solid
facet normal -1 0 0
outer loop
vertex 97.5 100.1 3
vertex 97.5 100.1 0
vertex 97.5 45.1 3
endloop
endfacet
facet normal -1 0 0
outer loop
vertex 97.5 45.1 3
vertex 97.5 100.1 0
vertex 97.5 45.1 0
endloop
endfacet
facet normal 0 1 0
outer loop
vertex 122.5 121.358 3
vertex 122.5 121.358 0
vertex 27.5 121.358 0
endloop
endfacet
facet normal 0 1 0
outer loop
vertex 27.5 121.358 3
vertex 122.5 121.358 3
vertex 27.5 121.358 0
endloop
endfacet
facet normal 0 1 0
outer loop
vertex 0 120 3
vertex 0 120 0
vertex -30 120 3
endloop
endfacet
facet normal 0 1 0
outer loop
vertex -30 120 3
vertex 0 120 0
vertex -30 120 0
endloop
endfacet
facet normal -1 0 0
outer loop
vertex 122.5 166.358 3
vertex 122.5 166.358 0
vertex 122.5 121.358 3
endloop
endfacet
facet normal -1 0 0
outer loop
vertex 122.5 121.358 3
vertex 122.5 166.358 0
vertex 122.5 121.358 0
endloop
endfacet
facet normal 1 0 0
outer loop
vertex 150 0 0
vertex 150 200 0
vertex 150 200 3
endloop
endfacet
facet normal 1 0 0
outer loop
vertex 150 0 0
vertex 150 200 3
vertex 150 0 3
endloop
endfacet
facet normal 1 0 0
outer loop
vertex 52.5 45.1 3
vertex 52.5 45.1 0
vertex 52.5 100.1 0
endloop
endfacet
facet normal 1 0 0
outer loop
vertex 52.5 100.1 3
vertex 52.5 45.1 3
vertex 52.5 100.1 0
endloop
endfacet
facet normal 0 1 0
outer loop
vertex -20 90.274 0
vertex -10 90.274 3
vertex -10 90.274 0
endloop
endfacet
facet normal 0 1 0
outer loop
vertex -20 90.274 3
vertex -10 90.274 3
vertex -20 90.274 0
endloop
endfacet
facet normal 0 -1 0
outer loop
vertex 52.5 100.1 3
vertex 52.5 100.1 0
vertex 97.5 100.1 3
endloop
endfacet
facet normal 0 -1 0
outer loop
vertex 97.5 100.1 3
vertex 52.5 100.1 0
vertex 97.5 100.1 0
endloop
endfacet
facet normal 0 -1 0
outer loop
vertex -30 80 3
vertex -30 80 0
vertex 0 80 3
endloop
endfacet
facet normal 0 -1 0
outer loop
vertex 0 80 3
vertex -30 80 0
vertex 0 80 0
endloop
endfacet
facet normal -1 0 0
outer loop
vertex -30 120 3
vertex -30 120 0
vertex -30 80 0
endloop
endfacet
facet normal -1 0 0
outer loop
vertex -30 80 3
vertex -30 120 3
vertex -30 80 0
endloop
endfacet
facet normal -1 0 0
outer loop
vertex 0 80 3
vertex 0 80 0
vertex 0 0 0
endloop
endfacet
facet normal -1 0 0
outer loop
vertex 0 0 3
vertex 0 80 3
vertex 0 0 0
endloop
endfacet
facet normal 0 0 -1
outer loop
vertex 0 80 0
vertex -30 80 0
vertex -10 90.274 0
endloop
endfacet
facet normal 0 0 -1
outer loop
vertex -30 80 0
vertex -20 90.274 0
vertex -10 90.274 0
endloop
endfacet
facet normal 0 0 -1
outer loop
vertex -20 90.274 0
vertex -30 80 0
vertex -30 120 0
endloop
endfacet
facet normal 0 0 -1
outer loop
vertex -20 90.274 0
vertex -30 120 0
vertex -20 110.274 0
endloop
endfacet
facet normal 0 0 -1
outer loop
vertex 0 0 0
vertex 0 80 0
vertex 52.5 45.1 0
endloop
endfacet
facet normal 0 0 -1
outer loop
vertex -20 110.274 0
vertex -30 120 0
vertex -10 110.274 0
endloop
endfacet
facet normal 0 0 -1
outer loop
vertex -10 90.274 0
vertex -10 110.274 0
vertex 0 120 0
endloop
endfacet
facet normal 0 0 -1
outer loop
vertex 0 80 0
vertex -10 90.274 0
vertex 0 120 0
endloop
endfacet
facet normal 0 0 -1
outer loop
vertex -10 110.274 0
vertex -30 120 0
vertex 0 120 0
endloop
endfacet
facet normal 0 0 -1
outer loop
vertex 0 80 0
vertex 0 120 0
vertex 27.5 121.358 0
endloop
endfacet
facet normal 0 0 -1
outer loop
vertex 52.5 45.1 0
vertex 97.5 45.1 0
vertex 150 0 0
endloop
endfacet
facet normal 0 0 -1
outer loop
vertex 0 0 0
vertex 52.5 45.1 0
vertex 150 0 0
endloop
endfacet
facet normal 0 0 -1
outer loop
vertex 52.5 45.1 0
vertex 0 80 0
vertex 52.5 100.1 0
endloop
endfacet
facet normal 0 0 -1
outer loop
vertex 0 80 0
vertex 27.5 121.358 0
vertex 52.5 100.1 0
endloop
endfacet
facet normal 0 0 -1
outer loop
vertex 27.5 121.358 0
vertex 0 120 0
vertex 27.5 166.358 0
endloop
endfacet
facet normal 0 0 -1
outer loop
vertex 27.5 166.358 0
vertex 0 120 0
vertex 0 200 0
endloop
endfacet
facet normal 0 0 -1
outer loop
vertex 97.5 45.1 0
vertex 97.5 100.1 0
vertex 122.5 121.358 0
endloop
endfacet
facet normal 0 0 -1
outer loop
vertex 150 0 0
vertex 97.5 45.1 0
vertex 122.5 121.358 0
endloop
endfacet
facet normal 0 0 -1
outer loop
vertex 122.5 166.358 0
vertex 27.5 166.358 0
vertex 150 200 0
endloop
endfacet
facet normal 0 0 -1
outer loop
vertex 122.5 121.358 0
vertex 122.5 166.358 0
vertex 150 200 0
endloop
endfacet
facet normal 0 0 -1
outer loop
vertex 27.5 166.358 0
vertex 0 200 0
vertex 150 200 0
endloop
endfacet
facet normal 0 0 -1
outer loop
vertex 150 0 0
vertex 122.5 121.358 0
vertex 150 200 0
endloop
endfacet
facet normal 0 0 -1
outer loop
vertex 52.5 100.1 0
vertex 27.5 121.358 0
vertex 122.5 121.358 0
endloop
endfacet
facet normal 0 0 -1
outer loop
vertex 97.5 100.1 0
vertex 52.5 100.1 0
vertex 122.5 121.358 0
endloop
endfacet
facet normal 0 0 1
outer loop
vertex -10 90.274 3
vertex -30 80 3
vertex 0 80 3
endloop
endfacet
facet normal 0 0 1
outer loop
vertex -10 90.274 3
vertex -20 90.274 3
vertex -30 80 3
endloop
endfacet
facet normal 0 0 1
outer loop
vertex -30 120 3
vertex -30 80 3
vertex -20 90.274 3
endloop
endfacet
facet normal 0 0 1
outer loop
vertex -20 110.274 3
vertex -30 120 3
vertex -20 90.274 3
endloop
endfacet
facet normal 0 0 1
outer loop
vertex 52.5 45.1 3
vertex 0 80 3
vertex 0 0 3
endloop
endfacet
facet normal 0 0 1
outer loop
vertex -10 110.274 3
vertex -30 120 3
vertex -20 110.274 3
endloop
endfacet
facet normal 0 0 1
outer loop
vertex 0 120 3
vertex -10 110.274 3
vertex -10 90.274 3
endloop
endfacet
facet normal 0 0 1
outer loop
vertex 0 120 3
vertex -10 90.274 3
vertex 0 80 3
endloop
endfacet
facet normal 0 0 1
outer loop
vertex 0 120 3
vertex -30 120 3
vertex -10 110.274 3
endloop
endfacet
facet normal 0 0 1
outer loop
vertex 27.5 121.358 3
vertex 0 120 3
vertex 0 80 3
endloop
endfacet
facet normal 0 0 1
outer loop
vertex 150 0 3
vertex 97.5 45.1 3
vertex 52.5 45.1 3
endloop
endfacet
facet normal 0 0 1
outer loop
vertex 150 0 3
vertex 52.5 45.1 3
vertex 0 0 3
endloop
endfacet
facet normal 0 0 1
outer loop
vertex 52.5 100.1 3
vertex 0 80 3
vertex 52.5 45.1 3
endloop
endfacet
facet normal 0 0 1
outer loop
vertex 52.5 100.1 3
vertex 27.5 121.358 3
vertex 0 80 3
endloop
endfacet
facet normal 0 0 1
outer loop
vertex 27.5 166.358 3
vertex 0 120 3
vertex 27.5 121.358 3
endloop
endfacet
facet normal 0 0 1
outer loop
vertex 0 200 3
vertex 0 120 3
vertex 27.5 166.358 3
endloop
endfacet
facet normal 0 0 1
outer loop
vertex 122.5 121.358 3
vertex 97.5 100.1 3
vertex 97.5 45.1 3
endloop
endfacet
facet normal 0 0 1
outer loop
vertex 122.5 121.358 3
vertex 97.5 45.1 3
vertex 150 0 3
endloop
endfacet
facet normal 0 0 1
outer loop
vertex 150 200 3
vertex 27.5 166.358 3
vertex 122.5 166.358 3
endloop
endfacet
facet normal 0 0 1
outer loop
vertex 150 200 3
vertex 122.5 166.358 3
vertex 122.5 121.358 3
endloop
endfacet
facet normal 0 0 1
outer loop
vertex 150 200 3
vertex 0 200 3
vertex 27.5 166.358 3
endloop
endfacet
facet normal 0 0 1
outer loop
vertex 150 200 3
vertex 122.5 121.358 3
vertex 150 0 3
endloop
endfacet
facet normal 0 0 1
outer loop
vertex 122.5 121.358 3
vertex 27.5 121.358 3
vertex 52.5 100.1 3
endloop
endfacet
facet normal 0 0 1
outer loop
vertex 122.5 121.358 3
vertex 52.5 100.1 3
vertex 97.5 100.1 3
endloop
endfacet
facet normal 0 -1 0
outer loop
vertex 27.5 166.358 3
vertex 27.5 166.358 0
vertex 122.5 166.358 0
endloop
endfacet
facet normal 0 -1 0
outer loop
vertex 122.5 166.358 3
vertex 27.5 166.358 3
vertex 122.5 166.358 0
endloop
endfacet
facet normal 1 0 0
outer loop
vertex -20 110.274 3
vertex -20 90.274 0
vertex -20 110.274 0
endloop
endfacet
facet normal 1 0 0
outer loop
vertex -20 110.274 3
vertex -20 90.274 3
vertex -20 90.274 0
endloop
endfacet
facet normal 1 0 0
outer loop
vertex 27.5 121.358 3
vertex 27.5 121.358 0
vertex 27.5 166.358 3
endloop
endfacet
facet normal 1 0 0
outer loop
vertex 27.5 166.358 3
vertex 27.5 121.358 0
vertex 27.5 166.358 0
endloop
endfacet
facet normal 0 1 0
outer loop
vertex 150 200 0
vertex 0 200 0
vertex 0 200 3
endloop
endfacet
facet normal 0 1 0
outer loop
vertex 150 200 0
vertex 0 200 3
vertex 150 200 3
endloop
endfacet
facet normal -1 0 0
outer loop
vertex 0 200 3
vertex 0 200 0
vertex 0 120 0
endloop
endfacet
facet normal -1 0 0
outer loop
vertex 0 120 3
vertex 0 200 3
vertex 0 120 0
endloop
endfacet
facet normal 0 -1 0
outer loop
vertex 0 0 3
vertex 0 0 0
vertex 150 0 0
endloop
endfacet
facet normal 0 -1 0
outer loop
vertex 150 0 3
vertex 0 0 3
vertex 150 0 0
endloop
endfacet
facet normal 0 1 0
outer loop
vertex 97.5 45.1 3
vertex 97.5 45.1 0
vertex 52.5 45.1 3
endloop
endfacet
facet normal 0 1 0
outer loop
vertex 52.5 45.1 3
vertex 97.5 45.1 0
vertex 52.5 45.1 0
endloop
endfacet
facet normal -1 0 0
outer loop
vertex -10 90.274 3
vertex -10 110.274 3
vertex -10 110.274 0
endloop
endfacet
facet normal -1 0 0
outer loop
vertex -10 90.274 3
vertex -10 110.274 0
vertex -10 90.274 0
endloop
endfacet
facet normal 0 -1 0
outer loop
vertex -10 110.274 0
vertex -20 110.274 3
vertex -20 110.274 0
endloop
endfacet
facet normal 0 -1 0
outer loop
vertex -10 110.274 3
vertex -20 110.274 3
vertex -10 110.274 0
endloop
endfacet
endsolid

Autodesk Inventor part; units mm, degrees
ref_plane "YZ Plane" through (0, 0, 0) normal (1, 0, 0) x (0, 1, 0)
ref_plane "XZ Plane" through (0, 0, 0) normal (0, 1, 0) x (-1, 0, 0)
ref_plane "XY Plane" through (0, 0, 0) normal (0, 0, 1) x (1, 0, 0)
sketch "Sketch1" plane through (0, 0, 0) normal (0, 0, 1) x (1, 0, 0)
  line L0 (27.5, 166.3577) -> (122.5, 166.3577)
  line L1 (122.5, 166.3577) -> (122.5, 121.3577)
  line L2 (122.5, 121.3577) -> (27.5, 121.3577)
  line L3 (27.5, 121.3577) -> (27.5, 166.3577)
  line L4 (52.5, 100.1) -> (97.5, 100.1)
  line L5 (97.5, 100.1) -> (97.5, 45.1)
  line L6 (97.5, 45.1) -> (52.5, 45.1)
  line L7 (52.5, 45.1) -> (52.5, 100.1)
  line L8 (0, 0) -> (150, 0)
  line L9 (0, 200) -> (150, 200)
  line L10 (0, 153.4) -> (0, 120)
  line L11 (0, 80) -> (0, 0)
  line L12 (0, 153.4) -> (0, 200)
  line L13 (0, 120) -> (-30, 120)
  line L14 (-30, 120) -> (-30, 80)
  line L15 (-30, 80) -> (0, 80)
  line L16 (-20, 110) -> (-10, 110)
  line L17 (-10, 110) -> (-10, 90)
  line L18 (-10, 90) -> (-20, 90)
  line L19 (-20, 90) -> (-20, 110)
  line L20 (150, 200) -> (150, 0)
  dimension "d0" = 150
  dimension "d49" = 200
  dimension "d50" = 40
  dimension "d51" = 80
  dimension "d52" = 10
  dimension "d53" = 95
  dimension "d54" = 45
  dimension "d55" = 45
  dimension "d56" = 55
extrude "Extrusion1" add sketch "Sketch1" along normal blind 3 contours L11 L15 L14 L13 L10 L12 L9 L20 L8 | L16 L17 L18 L19
sketch "Sketch2" plane through (0, 0, 3) normal (0, 0, 1) x (1, 0, 0)
  line L0 (-30, 80.2736) -> (0, 80.2736)
  line L1 (-20, 110.2736) -> (-10, 110.2736)
  line L2 (-10, 110.2736) -> (-10, 90.2736)
  line L3 (-10, 90.2736) -> (-20, 90.2736)
  line L4 (-20, 90.2736) -> (-20, 110.2736)
  line L5 (0, 117.7458) -> (0, 120.2736)
  point P0 (0, 0)
extrude "Extrusion2" cut sketch "Sketch2" against normal blind 3
properties part number "depan"
